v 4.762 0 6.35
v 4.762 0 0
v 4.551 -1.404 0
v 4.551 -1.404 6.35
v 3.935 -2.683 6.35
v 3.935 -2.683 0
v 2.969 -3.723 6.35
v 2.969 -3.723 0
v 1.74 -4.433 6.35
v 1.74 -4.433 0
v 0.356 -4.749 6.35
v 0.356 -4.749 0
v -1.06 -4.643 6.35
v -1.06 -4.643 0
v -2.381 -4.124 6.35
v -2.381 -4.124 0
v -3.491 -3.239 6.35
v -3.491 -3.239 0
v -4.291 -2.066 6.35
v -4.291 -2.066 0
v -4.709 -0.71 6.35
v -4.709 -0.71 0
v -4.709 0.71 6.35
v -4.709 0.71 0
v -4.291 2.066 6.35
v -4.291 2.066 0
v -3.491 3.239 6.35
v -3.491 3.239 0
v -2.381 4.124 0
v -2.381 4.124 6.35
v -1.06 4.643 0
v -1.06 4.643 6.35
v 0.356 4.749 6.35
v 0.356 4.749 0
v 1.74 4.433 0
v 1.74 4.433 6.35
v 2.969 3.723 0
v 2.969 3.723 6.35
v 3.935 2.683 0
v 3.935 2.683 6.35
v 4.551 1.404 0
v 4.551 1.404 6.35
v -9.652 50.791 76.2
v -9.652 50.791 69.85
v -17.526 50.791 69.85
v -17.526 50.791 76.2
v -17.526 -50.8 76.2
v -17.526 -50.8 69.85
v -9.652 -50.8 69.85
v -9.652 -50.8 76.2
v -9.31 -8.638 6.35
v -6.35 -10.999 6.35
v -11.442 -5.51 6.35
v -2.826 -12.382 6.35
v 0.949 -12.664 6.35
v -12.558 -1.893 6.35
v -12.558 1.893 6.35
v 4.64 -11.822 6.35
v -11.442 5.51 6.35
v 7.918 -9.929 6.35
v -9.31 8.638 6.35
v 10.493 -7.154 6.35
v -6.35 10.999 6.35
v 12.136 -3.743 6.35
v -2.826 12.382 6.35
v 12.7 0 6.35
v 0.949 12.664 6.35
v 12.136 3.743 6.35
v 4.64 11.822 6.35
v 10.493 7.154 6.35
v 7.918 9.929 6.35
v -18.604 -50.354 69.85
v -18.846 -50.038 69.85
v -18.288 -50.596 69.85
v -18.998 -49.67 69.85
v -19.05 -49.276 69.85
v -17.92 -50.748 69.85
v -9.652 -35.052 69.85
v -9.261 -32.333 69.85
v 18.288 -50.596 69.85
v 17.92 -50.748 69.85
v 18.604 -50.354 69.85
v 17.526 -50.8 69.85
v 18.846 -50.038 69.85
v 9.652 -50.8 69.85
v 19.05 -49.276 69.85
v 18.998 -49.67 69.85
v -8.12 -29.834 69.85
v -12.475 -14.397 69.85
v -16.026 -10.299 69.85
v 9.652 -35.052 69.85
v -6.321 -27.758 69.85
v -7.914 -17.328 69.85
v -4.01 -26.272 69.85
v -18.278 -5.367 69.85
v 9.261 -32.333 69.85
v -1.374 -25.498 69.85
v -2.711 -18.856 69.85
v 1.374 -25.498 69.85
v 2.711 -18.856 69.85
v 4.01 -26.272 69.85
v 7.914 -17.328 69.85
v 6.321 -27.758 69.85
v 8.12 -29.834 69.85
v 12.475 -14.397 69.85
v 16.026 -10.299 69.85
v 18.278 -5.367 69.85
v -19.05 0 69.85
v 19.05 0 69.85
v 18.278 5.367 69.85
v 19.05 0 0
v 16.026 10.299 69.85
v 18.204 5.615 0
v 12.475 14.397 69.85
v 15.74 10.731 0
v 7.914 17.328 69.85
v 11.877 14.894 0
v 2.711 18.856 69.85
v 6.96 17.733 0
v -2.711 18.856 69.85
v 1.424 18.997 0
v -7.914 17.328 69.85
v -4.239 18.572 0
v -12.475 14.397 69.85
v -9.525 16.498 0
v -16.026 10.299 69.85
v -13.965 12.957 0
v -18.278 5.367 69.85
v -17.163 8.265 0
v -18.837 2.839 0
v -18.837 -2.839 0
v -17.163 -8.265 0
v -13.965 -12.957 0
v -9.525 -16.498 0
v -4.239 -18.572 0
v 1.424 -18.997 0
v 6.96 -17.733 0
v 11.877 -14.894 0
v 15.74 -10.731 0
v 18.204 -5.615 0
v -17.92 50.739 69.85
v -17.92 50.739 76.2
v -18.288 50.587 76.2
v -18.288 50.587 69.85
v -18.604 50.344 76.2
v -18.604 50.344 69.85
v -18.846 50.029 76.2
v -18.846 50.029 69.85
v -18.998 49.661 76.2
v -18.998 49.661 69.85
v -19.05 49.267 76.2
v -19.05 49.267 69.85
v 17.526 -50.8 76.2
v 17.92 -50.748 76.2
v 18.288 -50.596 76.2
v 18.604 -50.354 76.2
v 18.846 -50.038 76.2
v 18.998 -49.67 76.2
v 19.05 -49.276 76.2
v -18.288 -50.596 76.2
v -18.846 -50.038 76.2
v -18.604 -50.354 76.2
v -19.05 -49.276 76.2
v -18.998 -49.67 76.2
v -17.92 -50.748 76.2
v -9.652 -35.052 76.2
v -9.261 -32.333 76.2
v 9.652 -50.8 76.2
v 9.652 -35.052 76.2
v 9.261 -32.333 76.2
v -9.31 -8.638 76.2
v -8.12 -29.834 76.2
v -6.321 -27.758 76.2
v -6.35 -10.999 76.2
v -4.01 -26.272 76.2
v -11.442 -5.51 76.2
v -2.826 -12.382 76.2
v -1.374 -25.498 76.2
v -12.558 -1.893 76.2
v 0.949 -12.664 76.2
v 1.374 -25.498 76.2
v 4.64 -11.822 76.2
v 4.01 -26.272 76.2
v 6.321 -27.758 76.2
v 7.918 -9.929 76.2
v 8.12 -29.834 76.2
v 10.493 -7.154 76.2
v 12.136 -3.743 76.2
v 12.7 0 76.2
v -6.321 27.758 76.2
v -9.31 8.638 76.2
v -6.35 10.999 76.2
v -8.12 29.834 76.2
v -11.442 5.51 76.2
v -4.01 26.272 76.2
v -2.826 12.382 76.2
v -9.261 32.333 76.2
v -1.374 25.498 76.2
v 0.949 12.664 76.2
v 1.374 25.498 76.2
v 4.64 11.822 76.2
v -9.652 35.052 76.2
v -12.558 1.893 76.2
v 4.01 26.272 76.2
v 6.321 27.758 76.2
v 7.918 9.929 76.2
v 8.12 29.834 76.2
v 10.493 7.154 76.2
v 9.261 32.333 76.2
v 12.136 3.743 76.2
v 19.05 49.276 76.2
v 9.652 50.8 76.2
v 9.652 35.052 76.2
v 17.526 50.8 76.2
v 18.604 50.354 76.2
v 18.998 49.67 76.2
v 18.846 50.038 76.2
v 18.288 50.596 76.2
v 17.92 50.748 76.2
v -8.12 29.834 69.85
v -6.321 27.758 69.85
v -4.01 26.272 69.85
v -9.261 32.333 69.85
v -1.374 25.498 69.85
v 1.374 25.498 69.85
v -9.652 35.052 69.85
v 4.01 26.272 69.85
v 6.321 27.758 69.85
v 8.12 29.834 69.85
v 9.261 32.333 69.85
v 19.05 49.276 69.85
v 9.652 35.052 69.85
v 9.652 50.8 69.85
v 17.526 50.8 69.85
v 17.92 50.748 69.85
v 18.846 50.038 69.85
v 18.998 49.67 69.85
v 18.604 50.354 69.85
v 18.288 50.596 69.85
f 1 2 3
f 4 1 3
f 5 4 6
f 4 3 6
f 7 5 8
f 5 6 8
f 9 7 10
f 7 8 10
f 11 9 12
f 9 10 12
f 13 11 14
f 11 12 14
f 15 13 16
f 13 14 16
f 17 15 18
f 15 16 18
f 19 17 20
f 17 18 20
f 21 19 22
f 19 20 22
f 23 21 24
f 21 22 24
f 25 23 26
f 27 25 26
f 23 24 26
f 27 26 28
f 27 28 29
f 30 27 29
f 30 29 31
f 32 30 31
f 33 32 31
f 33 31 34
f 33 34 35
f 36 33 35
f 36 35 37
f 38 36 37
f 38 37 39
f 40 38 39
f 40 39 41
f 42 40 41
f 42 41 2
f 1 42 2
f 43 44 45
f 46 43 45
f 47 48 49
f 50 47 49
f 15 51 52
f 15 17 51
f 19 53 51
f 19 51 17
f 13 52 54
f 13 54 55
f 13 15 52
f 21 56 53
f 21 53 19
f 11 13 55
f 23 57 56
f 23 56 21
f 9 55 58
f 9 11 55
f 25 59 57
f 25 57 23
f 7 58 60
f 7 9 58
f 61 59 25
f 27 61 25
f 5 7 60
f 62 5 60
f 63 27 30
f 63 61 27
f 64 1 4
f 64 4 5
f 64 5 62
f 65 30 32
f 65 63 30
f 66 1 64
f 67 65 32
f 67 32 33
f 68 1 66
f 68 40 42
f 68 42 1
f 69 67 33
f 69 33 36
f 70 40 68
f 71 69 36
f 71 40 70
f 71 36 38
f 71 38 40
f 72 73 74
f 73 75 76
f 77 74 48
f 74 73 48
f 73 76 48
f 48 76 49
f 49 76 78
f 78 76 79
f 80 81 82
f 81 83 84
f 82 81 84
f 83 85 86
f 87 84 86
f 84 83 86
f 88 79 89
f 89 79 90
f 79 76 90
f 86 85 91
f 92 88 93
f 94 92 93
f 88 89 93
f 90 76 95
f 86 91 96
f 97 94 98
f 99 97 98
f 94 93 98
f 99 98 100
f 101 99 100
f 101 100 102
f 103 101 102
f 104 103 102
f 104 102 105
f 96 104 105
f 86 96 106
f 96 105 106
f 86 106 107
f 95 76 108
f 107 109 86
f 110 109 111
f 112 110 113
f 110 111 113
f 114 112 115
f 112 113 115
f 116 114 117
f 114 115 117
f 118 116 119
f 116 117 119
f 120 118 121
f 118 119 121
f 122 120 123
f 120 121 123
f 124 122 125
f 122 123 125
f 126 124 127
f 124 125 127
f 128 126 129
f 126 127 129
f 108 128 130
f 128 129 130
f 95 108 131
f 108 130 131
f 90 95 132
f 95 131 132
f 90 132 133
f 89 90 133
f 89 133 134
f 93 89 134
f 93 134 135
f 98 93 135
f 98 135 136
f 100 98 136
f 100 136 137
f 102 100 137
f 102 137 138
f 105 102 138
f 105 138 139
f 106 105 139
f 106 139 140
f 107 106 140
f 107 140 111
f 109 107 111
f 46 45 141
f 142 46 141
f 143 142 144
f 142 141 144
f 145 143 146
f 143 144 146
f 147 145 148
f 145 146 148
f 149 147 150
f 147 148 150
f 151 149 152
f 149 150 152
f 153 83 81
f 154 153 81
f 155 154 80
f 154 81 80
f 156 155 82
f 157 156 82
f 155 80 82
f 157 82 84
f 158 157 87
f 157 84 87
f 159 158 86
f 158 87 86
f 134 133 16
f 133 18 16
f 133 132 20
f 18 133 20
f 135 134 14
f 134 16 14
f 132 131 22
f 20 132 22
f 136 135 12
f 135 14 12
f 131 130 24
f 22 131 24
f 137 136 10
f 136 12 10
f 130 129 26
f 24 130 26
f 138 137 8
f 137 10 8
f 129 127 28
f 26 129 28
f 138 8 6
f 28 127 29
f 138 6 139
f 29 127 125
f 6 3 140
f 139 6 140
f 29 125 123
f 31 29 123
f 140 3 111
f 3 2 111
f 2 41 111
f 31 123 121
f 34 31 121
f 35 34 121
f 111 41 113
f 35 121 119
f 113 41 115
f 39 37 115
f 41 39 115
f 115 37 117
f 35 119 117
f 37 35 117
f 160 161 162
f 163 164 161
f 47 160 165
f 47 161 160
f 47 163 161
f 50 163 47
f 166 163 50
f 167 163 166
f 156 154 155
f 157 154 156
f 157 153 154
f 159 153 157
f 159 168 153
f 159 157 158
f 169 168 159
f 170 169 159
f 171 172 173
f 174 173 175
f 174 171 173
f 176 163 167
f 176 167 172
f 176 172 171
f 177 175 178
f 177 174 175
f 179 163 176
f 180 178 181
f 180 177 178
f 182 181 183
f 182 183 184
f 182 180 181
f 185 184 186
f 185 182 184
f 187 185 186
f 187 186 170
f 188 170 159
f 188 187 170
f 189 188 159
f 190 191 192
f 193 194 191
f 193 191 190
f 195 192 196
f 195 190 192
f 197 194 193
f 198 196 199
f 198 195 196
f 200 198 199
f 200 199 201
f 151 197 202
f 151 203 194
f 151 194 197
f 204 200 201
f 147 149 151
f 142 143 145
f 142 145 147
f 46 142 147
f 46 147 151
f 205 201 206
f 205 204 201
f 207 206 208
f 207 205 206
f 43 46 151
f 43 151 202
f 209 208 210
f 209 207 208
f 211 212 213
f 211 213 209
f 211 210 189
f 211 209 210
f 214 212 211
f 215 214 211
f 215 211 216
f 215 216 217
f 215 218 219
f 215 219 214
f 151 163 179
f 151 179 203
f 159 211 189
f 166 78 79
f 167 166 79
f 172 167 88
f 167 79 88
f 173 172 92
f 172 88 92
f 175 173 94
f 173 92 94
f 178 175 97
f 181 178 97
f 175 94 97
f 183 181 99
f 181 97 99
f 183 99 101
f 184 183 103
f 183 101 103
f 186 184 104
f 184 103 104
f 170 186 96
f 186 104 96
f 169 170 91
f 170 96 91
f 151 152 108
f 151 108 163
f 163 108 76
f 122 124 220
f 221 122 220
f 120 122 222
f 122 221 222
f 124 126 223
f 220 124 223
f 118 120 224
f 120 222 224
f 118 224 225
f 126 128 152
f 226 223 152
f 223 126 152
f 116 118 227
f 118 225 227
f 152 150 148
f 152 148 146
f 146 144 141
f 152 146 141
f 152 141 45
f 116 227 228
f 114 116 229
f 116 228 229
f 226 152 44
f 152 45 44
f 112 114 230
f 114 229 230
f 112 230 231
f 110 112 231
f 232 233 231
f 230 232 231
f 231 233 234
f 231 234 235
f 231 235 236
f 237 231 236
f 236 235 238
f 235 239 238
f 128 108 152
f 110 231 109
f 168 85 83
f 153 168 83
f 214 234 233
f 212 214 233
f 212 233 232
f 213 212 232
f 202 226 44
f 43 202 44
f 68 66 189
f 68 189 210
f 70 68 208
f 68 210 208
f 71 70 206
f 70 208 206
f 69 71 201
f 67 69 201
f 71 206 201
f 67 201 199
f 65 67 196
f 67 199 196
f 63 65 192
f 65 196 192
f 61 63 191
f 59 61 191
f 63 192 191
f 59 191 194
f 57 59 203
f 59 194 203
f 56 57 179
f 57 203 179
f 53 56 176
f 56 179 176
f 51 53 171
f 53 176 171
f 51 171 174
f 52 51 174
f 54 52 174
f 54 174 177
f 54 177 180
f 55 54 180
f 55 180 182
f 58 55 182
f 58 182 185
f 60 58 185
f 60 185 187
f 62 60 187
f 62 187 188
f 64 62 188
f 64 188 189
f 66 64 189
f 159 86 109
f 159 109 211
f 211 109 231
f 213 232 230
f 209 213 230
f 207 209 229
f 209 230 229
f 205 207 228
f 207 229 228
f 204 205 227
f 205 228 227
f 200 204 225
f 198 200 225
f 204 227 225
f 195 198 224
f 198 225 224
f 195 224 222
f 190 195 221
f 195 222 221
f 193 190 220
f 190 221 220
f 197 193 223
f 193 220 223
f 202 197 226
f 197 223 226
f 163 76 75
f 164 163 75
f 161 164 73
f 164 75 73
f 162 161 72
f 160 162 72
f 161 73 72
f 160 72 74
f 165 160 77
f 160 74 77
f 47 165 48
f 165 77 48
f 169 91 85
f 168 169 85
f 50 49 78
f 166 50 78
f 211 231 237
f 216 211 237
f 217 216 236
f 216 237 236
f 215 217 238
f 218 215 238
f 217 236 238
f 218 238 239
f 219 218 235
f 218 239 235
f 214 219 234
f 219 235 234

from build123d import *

# Parameters (mm, degrees)
F0_R     = 19.05
F1_DEPTH = 69.85
F2_R     = 12.7
F3_DEPTH = 63.5
F4_R     = 4.7625
F5_DEPTH = 69.851
F7_DEPTH = 6.35
F8_R     = 12.7
F9_DEPTH = 6.35


with BuildPart() as f1:
    # F0 (on Top) → F1 (new body)
    with BuildSketch(Plane.XY):
        Circle(F0_R)
    extrude(amount=F1_DEPTH)

    # F2 (on face) → F3 (cut)
    with BuildSketch(Plane.XY.offset(69.85)):
        Circle(F2_R)
    extrude(amount=-F3_DEPTH, mode=Mode.SUBTRACT)

    # F4 (on face) → F5 (cut, through all)
    with BuildSketch(Plane(origin=(0, 0, 0), x_dir=(1, 0, 0), z_dir=(0, 0, -1))):
        Circle(F4_R)
    extrude(amount=-F5_DEPTH, mode=Mode.SUBTRACT)

    # F6 (on face) → F7 (join)
    with BuildSketch(Plane.XY.offset(69.85)):
        with BuildLine():
            ThreePointArc((-17.526, 50.7907223972), (-18.6036307345, 50.3443531317), (-19.05, 49.2667223972))
            Line((-19.05, 49.2667223972), (-19.05, -49.276))
            ThreePointArc((-19.05, -49.276), (-18.6036307345, -50.3536307345), (-17.526, -50.8))
            Line((-17.526, -50.8), (-9.652, -50.8))
            Line((-9.652, -50.8), (-9.652, -35.052))
            ThreePointArc((-9.652, -35.052), (0, -25.4), (9.652, -35.052))
            Line((9.652, -35.052), (9.652, -50.8))
            Line((9.652, -50.8), (17.526, -50.8))
            ThreePointArc((17.526, -50.8), (18.6036307345, -50.3536307345), (19.05, -49.276))
            Line((19.05, -49.276), (19.05, 49.276))
            ThreePointArc((19.05, 49.276), (18.6036307345, 50.3536307345), (17.526, 50.8))
            Line((17.526, 50.8), (9.652, 50.8))
            Line((9.652, 50.8), (9.652, 35.052))
            ThreePointArc((9.652, 35.052), (0, 25.4), (-9.652, 35.052))
            Line((-9.652, 35.052), (-9.652, 50.7907223972))
            Line((-9.652, 50.7907223972), (-17.526, 50.7907223972))
        make_face()
    extrude(amount=F7_DEPTH)

    # F8 (on face) → F9 (cut)
    with BuildSketch(Plane.XY.offset(76.2)):
        Circle(F8_R)
    extrude(amount=-F9_DEPTH, mode=Mode.SUBTRACT)


solid = f1.part
